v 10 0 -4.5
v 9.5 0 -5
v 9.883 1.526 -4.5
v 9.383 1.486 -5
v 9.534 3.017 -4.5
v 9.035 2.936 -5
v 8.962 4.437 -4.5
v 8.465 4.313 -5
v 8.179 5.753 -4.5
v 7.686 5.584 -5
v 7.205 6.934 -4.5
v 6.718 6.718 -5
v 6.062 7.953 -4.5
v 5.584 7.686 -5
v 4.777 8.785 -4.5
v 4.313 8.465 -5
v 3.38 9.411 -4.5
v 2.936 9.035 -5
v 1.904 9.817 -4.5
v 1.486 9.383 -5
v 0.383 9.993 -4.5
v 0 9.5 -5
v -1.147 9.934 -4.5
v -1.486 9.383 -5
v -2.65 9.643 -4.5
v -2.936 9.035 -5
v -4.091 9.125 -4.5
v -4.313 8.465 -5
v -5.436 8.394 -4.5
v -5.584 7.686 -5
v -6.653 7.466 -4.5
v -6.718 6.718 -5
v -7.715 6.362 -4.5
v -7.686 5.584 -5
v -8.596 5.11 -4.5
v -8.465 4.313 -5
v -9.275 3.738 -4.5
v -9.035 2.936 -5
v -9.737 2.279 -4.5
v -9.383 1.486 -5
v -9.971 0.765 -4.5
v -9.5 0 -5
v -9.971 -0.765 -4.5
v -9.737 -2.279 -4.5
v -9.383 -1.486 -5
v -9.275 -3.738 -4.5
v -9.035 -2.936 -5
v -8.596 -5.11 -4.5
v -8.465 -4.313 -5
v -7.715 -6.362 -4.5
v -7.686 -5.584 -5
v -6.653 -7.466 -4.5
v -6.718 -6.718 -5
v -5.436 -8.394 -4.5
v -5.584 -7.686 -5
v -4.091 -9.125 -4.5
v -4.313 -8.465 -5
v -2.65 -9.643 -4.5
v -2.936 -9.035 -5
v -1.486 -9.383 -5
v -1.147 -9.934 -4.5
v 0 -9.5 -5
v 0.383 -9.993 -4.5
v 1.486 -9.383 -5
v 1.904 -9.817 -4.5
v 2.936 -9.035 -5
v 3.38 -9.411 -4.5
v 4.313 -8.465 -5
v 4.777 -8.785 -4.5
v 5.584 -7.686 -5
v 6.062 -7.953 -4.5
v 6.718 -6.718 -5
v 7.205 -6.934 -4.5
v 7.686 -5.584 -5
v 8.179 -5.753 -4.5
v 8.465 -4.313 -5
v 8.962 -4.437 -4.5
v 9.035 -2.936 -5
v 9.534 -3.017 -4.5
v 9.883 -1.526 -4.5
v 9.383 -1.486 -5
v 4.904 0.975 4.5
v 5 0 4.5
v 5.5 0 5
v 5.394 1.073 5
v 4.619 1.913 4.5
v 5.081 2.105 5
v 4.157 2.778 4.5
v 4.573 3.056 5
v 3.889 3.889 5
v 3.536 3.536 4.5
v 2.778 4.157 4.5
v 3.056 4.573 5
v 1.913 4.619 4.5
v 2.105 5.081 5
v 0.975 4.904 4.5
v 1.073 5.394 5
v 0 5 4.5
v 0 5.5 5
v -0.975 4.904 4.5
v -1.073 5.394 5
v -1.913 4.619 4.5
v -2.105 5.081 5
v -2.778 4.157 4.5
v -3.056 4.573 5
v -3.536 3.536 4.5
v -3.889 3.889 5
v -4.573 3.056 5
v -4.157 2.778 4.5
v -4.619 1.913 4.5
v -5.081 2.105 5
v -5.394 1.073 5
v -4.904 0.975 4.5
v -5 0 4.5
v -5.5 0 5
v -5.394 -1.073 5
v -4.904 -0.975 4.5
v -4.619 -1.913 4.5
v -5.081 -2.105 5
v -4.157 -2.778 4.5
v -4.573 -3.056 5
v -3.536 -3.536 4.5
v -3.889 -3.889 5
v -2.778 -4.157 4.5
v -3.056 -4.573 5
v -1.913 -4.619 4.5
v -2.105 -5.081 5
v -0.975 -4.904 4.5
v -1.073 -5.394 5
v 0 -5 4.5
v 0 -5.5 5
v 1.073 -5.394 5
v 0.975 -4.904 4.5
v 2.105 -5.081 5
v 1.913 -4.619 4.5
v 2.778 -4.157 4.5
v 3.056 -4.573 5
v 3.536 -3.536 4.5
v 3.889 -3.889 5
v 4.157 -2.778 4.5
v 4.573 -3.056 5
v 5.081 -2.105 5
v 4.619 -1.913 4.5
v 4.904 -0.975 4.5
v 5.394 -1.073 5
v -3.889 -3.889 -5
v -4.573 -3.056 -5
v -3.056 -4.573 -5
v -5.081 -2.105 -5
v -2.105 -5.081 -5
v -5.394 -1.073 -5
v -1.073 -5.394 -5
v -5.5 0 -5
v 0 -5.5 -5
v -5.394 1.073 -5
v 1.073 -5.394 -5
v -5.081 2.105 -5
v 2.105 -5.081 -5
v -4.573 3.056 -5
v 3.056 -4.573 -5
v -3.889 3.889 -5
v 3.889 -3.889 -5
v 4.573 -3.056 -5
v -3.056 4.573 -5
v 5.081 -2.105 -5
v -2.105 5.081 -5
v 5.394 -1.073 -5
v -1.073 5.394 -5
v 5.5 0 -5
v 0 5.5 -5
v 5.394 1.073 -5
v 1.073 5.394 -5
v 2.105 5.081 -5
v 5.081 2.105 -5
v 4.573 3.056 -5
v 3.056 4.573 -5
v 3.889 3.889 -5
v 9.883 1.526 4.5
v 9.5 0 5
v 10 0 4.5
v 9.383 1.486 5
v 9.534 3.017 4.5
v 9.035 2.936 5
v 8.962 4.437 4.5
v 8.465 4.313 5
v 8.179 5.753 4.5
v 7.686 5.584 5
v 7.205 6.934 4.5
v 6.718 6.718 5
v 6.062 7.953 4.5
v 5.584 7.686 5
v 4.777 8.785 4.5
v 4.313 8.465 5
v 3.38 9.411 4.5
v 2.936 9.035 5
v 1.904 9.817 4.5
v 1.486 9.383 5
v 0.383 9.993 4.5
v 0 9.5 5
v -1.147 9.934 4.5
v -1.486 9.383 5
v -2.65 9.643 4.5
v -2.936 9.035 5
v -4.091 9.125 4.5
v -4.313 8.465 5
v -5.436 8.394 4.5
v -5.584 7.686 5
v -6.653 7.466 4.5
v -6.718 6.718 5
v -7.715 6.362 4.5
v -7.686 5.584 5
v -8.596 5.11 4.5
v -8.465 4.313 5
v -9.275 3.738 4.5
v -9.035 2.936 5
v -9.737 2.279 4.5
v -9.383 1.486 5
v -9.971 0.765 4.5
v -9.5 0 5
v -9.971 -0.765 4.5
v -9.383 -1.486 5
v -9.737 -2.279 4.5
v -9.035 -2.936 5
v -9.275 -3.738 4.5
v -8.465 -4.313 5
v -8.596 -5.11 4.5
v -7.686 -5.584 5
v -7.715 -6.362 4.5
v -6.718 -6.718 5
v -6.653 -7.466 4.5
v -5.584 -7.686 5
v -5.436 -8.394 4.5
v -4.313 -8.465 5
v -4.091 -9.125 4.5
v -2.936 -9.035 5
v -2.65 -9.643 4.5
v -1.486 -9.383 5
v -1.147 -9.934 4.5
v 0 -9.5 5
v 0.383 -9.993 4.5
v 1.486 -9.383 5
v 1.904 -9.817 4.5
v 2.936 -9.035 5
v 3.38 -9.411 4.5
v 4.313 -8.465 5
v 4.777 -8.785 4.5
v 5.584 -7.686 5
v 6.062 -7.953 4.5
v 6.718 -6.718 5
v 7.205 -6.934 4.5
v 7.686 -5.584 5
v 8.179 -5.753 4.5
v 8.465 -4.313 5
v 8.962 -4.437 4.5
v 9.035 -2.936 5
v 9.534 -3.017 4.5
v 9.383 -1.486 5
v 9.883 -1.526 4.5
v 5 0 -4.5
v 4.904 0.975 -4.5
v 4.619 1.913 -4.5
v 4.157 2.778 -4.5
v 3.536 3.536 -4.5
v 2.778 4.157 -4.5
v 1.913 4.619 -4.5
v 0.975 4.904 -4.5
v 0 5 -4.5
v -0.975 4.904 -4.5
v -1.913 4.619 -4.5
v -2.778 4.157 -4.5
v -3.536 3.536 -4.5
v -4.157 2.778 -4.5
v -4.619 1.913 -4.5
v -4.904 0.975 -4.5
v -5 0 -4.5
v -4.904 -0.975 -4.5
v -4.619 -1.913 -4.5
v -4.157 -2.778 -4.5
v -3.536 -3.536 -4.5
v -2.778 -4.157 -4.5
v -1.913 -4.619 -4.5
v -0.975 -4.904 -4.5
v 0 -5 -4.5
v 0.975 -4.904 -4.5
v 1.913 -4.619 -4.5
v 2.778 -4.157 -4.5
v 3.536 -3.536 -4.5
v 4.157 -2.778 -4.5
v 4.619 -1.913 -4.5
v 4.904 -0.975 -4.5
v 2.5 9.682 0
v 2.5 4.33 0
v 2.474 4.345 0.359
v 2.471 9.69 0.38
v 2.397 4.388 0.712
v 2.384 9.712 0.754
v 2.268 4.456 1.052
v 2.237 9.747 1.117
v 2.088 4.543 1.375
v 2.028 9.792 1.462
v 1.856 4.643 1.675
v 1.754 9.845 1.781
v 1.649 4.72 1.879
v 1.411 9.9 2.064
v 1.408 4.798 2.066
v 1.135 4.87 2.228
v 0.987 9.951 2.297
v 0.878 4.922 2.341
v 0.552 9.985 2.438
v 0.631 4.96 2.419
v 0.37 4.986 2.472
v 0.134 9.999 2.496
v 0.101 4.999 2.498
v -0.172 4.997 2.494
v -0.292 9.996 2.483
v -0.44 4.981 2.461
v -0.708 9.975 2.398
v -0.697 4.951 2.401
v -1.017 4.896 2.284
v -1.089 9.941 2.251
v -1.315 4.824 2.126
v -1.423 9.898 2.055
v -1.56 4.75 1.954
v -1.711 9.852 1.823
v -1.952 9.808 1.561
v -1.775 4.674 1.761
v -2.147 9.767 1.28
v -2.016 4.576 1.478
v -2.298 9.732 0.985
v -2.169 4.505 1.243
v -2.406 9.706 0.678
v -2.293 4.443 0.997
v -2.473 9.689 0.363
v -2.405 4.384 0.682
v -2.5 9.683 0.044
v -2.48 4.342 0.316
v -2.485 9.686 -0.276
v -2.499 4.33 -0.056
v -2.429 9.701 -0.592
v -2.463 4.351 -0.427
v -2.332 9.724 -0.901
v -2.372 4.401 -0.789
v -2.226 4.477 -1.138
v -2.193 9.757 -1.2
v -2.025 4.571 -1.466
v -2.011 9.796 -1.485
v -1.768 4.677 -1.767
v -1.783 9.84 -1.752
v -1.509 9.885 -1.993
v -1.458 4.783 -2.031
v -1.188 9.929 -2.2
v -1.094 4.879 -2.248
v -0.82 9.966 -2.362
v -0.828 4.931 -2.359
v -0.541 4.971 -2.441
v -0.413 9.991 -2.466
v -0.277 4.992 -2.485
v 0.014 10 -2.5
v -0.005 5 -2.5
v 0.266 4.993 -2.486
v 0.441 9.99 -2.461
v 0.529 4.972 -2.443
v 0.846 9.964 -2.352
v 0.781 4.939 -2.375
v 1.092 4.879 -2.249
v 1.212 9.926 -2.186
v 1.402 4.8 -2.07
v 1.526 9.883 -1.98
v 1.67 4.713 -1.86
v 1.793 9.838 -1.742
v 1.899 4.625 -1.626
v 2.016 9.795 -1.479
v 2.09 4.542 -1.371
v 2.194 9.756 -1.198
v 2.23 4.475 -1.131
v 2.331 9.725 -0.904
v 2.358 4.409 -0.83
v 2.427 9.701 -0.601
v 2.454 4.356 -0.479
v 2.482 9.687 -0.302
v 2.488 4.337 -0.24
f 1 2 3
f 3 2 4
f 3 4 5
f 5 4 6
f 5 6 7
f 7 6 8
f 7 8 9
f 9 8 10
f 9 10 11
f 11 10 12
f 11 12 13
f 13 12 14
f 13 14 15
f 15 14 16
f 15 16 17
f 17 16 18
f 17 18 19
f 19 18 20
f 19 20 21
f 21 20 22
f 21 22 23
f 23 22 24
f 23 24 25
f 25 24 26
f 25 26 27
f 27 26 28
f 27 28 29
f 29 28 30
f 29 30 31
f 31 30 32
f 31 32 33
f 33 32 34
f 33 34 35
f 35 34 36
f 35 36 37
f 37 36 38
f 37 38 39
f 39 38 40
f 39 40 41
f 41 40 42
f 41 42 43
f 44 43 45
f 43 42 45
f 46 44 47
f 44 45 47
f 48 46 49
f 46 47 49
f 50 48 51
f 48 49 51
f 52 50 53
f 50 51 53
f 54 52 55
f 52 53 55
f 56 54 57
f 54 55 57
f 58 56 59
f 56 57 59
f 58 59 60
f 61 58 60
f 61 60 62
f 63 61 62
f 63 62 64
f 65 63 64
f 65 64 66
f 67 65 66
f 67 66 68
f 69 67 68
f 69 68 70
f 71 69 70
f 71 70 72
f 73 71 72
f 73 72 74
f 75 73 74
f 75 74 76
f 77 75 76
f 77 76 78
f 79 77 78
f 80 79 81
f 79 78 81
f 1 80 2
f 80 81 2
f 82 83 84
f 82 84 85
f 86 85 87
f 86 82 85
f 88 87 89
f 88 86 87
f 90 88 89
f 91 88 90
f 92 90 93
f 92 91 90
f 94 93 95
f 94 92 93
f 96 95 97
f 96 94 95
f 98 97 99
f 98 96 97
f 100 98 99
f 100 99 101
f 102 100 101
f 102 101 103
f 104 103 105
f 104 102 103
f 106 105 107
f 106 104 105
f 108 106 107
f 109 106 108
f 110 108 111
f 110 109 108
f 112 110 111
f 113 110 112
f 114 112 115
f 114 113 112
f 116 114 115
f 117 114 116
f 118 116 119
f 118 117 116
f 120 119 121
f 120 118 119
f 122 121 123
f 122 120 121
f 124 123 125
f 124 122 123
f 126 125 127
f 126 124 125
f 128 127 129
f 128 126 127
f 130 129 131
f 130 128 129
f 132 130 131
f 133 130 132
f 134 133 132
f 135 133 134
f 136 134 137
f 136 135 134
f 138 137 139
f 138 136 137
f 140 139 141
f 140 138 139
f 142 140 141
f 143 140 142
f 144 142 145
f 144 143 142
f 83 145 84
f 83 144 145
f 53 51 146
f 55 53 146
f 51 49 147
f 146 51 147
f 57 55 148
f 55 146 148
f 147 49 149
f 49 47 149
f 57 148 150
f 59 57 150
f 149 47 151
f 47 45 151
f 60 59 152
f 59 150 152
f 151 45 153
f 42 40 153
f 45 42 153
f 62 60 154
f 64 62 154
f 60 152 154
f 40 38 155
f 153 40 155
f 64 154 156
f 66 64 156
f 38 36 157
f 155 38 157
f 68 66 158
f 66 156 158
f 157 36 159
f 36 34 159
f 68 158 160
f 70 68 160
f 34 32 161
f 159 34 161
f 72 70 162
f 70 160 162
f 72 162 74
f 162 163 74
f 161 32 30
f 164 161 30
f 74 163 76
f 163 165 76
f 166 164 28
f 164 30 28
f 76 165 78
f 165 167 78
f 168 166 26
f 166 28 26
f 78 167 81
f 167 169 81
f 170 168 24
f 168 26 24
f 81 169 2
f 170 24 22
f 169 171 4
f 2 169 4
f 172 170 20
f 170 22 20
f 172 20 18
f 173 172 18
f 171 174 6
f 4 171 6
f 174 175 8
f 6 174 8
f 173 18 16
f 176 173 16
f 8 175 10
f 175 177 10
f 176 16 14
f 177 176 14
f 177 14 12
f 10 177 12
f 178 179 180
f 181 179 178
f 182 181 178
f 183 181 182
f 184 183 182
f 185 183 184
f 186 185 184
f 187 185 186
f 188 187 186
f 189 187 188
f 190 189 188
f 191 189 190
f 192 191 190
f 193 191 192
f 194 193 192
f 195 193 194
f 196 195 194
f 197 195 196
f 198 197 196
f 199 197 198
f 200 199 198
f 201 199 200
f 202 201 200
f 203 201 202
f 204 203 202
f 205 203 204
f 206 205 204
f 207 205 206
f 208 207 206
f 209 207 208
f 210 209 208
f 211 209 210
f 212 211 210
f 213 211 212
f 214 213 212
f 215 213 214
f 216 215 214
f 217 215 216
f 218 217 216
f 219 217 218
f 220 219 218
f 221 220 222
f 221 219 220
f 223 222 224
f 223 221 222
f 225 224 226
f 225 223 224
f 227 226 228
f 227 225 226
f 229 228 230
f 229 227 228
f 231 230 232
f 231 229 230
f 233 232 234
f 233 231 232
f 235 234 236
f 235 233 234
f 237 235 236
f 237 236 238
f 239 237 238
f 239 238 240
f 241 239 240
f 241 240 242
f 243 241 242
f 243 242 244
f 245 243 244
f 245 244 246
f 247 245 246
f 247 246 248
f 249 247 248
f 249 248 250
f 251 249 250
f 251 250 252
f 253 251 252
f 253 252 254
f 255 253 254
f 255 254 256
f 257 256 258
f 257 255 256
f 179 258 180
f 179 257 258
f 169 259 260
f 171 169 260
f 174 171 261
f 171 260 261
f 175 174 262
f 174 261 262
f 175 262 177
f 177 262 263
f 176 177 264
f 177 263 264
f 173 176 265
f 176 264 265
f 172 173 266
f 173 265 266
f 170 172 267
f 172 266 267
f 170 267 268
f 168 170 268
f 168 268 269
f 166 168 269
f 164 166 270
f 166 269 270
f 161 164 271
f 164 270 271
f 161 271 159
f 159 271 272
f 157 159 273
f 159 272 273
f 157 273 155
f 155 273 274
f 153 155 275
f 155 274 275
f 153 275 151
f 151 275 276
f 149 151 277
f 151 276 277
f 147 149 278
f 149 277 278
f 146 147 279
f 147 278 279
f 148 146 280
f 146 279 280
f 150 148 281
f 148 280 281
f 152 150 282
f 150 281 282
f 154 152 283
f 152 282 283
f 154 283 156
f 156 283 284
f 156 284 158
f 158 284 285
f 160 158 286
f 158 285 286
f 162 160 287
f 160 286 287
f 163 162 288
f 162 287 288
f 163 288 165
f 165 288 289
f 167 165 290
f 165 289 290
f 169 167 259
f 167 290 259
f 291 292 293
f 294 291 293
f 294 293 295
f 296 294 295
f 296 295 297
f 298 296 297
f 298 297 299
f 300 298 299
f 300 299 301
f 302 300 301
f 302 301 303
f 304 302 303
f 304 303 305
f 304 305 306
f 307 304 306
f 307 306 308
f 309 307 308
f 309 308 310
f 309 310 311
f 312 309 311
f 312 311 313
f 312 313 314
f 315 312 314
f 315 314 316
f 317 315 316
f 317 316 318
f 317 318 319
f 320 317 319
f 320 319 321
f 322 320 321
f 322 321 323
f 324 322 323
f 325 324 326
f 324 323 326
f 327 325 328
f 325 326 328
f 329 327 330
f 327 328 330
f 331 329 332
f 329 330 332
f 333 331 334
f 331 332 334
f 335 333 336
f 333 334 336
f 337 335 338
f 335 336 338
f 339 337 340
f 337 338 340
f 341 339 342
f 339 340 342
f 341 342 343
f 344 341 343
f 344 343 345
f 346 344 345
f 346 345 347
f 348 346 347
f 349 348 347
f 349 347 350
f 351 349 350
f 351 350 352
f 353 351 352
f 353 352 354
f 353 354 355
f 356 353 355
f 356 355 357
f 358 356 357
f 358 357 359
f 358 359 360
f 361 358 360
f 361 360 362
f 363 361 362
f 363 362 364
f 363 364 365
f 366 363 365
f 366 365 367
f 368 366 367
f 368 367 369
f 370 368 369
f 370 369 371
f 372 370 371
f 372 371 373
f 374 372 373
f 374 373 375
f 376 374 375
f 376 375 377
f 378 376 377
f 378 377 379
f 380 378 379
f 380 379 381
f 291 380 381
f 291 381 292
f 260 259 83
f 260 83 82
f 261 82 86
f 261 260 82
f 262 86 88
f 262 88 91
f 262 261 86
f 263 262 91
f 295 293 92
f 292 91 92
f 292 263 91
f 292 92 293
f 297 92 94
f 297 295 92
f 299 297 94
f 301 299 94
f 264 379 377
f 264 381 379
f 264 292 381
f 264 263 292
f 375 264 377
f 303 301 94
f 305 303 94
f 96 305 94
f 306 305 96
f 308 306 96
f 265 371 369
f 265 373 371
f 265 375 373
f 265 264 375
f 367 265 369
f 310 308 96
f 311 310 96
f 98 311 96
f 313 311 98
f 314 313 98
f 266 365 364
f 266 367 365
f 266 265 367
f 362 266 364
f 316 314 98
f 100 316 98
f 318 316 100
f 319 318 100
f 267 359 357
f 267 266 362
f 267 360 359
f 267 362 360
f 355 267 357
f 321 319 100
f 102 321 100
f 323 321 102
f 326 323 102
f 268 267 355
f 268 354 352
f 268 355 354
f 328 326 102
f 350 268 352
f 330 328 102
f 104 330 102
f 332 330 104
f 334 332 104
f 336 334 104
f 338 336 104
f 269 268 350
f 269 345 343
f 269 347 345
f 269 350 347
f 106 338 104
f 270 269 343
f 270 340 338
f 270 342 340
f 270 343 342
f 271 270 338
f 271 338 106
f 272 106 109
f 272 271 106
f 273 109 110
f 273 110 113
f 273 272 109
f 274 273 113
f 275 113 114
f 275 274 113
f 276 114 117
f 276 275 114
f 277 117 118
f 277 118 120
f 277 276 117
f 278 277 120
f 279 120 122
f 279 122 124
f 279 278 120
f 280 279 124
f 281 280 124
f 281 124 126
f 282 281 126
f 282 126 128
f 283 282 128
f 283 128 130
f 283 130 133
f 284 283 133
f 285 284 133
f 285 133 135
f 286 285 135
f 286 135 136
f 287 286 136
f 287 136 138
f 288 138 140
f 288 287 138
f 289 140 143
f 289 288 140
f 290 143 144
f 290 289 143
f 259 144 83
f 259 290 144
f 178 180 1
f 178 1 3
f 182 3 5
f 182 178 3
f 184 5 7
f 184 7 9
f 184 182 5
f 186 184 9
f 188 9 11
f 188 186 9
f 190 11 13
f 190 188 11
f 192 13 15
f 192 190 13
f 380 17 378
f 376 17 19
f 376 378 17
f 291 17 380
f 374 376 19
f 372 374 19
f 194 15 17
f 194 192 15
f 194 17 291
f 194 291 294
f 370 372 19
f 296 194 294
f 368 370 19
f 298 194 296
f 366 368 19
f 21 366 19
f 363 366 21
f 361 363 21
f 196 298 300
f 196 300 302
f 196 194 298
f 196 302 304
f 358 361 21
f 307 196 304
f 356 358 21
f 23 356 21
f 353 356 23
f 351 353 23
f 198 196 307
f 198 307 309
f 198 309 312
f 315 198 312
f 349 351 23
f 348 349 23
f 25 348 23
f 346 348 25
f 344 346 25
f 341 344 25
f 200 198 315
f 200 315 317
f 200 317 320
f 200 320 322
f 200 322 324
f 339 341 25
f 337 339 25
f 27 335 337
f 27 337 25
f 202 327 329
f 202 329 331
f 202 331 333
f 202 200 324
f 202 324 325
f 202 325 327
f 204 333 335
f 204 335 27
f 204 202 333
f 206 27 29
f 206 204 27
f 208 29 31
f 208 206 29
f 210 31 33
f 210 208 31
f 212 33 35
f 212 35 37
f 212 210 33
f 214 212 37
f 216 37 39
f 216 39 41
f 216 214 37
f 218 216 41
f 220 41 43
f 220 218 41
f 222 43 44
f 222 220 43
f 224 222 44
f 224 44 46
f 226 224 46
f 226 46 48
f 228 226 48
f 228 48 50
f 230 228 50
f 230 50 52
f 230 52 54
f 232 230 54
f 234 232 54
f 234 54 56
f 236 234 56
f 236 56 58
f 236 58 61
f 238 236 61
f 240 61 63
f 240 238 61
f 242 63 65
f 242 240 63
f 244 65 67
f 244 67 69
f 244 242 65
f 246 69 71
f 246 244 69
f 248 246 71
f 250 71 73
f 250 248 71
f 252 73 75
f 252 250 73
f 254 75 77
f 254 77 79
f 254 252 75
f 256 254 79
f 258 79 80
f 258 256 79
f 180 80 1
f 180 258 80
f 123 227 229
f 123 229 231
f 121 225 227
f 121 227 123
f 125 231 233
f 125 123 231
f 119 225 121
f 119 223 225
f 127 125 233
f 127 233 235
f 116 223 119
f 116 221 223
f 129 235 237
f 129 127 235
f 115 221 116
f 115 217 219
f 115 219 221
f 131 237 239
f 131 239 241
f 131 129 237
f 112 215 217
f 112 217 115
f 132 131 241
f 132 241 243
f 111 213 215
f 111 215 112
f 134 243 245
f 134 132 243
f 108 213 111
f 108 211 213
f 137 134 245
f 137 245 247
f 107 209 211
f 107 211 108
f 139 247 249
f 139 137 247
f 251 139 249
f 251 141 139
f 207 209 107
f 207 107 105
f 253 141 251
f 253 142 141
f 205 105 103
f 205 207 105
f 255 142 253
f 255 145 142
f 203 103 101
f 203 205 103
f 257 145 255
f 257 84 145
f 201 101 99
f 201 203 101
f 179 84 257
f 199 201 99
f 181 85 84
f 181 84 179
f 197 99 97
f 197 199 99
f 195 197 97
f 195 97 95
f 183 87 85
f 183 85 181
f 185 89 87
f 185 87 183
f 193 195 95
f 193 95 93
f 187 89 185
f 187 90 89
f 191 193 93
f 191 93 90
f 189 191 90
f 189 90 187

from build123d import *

# Parameters (mm, degrees)
SKETCH_R     = 10
SKETCH_R_2   = 5
PAD_DEPTH    = 5
SKETCH001_R  = 2.5
POCKET_DEPTH = 10.001
CHAMFER_SIZE = 0.5


with BuildPart() as part:
    # Sketch → Pad (new body, symmetric)
    with BuildSketch(Plane.XY):
        Circle(SKETCH_R)
        Circle(SKETCH_R_2, mode=Mode.SUBTRACT)
    extrude(amount=PAD_DEPTH, both=True)

    # Sketch001 → Pocket (cut, through all)
    with BuildSketch(Plane.XZ):
        Circle(SKETCH001_R)
    extrude(amount=-POCKET_DEPTH, mode=Mode.SUBTRACT)

    # Chamfer
    chamfer_edges = [part.edges().sort_by_distance(p)[0] for p in [
        (-5, 0, -5),
        (-10, 0, -5),
        (-5, 0, 5),
        (-10, 0, 5),
    ]]
    chamfer(chamfer_edges, length=CHAMFER_SIZE)


solid = part.part
